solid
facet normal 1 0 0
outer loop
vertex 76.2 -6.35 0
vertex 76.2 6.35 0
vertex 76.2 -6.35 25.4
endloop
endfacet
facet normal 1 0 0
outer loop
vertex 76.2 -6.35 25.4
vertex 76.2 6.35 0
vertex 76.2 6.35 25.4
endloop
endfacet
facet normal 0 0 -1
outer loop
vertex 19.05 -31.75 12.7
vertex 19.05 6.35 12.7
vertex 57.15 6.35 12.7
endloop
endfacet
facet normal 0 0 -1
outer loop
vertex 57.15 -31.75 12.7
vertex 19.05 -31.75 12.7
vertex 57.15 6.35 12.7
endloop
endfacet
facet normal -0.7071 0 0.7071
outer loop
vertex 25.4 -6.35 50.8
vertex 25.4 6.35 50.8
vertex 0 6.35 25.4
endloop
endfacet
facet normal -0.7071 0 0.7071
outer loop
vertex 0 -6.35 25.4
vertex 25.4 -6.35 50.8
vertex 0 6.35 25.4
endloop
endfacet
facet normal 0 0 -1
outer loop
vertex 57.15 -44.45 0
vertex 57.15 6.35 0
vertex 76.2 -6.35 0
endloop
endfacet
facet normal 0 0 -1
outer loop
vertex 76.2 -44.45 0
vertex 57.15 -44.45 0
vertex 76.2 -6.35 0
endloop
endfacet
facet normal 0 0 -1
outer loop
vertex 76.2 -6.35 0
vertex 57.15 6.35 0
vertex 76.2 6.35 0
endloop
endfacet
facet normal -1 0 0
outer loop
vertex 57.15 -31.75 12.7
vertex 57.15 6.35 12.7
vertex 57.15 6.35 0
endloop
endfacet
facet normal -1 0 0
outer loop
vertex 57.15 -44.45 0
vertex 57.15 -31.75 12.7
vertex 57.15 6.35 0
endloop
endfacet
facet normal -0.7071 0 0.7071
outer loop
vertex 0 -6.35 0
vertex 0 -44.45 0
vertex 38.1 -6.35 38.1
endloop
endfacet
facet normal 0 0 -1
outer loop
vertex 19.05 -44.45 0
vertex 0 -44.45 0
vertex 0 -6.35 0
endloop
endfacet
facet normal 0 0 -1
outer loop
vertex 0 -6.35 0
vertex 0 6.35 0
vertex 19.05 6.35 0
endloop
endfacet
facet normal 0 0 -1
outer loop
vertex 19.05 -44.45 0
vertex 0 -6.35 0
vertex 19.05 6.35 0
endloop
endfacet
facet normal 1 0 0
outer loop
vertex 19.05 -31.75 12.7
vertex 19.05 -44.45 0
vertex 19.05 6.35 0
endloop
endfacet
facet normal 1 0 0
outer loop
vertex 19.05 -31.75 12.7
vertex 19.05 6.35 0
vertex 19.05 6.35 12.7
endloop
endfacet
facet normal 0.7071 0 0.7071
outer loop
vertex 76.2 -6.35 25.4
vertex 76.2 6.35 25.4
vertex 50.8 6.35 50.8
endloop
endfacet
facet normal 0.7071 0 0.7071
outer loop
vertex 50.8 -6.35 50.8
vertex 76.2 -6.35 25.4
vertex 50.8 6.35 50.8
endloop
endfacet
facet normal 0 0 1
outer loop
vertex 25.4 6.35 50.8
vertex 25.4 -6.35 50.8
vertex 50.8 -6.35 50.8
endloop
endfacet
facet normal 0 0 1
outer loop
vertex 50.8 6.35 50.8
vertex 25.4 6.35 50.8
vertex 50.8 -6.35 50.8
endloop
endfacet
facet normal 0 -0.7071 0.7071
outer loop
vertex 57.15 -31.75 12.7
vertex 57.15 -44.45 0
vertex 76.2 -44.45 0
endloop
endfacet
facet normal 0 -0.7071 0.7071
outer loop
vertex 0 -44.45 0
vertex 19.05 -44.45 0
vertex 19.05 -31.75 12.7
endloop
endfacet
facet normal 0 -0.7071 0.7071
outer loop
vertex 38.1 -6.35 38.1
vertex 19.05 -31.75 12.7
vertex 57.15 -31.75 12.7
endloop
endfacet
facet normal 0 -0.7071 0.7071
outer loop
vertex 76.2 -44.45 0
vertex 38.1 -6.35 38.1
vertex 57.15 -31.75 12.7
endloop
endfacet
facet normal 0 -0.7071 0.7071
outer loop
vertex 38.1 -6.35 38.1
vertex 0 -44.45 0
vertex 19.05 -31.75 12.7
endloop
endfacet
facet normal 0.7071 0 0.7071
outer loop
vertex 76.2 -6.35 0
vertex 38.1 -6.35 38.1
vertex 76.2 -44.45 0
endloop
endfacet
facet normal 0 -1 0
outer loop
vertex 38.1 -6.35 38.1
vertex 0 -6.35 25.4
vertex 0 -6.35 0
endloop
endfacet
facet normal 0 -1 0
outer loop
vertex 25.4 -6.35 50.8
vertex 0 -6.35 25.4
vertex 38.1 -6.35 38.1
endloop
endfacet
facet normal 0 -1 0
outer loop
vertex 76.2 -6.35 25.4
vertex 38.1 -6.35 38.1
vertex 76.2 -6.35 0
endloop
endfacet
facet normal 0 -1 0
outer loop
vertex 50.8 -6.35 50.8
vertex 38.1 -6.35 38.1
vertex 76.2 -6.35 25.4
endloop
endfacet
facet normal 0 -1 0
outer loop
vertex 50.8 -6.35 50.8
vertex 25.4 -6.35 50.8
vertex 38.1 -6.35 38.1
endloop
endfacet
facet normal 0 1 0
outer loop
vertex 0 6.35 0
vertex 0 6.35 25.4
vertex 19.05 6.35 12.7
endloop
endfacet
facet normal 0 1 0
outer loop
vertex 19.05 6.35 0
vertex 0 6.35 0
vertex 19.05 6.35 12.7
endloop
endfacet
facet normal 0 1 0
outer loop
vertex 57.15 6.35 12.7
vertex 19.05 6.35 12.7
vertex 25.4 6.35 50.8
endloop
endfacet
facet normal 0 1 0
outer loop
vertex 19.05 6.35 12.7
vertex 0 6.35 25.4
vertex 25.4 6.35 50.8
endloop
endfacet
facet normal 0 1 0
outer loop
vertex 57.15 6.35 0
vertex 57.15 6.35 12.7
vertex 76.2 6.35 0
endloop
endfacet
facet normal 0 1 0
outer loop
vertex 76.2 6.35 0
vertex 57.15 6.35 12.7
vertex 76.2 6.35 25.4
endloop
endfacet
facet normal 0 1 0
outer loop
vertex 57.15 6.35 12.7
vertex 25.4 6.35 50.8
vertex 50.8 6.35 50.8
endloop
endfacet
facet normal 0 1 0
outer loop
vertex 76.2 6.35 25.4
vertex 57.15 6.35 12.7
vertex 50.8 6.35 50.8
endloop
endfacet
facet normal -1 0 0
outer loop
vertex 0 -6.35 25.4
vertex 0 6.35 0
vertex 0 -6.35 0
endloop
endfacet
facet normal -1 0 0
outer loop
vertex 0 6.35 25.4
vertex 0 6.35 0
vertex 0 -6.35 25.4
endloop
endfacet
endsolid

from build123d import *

# Parameters (mm, degrees)
F0_W     = 76.2
F0_H     = 50.8
F1_DEPTH = 6.35
F2_W     = 76.2
F2_H     = 38.1
F3_DEPTH = 38.1
F5_DEPTH = 38.1
F7_DEPTH = 76.201
F9_DEPTH = 50.801


with BuildPart() as f1:
    # F0 (on Front) → F1 (new body, symmetric)
    with BuildSketch(Plane.XZ):
        with Locations((38.1, 25.4)):
            Rectangle(F0_W, F0_H)
    extrude(amount=F1_DEPTH, both=True)

    # F2 (on face) → F3 (join)
    with BuildSketch(Plane.XZ.offset(6.35)):
        with Locations((38.1, 19.05)):
            Rectangle(F2_W, F2_H)
    extrude(amount=F3_DEPTH)

    # F4 (on face) → F5 (cut)
    with BuildSketch(Plane.XZ.offset(44.45)):
        Polygon((0, 38.1), (0, 0), (38.1, 38.1), align=None)
        Polygon((76.2, 38.1), (38.1, 38.1), (76.2, 0), align=None)
    extrude(amount=-F5_DEPTH, mode=Mode.SUBTRACT)

    # F6 (on Right) → F7 (cut, through all)
    with BuildSketch(Plane.YZ):
        Polygon((-44.45, 0), (-6.35, 38.1), (-44.45, 38.1), align=None)
    extrude(amount=F7_DEPTH, mode=Mode.SUBTRACT)

    # F8 (on face) → F9 (cut, through all)
    with BuildSketch(Plane(origin=(0, 6.35, 0), x_dir=(-1, 0, 0), z_dir=(0, 1, 0))):
        Polygon((0, 50.8), (-25.4, 50.8), (0, 25.4), align=None)
        Polygon((-76.2, 50.8), (-76.2, 25.4), (-50.8, 50.8), align=None)
        Polygon((-57.15, 12.7), (-57.15, 0), (-38.1, 0), (-19.05, 0), (-19.05, 12.7), (-38.1, 12.7), align=None)
    extrude(amount=-F9_DEPTH, mode=Mode.SUBTRACT)


solid = f1.part
